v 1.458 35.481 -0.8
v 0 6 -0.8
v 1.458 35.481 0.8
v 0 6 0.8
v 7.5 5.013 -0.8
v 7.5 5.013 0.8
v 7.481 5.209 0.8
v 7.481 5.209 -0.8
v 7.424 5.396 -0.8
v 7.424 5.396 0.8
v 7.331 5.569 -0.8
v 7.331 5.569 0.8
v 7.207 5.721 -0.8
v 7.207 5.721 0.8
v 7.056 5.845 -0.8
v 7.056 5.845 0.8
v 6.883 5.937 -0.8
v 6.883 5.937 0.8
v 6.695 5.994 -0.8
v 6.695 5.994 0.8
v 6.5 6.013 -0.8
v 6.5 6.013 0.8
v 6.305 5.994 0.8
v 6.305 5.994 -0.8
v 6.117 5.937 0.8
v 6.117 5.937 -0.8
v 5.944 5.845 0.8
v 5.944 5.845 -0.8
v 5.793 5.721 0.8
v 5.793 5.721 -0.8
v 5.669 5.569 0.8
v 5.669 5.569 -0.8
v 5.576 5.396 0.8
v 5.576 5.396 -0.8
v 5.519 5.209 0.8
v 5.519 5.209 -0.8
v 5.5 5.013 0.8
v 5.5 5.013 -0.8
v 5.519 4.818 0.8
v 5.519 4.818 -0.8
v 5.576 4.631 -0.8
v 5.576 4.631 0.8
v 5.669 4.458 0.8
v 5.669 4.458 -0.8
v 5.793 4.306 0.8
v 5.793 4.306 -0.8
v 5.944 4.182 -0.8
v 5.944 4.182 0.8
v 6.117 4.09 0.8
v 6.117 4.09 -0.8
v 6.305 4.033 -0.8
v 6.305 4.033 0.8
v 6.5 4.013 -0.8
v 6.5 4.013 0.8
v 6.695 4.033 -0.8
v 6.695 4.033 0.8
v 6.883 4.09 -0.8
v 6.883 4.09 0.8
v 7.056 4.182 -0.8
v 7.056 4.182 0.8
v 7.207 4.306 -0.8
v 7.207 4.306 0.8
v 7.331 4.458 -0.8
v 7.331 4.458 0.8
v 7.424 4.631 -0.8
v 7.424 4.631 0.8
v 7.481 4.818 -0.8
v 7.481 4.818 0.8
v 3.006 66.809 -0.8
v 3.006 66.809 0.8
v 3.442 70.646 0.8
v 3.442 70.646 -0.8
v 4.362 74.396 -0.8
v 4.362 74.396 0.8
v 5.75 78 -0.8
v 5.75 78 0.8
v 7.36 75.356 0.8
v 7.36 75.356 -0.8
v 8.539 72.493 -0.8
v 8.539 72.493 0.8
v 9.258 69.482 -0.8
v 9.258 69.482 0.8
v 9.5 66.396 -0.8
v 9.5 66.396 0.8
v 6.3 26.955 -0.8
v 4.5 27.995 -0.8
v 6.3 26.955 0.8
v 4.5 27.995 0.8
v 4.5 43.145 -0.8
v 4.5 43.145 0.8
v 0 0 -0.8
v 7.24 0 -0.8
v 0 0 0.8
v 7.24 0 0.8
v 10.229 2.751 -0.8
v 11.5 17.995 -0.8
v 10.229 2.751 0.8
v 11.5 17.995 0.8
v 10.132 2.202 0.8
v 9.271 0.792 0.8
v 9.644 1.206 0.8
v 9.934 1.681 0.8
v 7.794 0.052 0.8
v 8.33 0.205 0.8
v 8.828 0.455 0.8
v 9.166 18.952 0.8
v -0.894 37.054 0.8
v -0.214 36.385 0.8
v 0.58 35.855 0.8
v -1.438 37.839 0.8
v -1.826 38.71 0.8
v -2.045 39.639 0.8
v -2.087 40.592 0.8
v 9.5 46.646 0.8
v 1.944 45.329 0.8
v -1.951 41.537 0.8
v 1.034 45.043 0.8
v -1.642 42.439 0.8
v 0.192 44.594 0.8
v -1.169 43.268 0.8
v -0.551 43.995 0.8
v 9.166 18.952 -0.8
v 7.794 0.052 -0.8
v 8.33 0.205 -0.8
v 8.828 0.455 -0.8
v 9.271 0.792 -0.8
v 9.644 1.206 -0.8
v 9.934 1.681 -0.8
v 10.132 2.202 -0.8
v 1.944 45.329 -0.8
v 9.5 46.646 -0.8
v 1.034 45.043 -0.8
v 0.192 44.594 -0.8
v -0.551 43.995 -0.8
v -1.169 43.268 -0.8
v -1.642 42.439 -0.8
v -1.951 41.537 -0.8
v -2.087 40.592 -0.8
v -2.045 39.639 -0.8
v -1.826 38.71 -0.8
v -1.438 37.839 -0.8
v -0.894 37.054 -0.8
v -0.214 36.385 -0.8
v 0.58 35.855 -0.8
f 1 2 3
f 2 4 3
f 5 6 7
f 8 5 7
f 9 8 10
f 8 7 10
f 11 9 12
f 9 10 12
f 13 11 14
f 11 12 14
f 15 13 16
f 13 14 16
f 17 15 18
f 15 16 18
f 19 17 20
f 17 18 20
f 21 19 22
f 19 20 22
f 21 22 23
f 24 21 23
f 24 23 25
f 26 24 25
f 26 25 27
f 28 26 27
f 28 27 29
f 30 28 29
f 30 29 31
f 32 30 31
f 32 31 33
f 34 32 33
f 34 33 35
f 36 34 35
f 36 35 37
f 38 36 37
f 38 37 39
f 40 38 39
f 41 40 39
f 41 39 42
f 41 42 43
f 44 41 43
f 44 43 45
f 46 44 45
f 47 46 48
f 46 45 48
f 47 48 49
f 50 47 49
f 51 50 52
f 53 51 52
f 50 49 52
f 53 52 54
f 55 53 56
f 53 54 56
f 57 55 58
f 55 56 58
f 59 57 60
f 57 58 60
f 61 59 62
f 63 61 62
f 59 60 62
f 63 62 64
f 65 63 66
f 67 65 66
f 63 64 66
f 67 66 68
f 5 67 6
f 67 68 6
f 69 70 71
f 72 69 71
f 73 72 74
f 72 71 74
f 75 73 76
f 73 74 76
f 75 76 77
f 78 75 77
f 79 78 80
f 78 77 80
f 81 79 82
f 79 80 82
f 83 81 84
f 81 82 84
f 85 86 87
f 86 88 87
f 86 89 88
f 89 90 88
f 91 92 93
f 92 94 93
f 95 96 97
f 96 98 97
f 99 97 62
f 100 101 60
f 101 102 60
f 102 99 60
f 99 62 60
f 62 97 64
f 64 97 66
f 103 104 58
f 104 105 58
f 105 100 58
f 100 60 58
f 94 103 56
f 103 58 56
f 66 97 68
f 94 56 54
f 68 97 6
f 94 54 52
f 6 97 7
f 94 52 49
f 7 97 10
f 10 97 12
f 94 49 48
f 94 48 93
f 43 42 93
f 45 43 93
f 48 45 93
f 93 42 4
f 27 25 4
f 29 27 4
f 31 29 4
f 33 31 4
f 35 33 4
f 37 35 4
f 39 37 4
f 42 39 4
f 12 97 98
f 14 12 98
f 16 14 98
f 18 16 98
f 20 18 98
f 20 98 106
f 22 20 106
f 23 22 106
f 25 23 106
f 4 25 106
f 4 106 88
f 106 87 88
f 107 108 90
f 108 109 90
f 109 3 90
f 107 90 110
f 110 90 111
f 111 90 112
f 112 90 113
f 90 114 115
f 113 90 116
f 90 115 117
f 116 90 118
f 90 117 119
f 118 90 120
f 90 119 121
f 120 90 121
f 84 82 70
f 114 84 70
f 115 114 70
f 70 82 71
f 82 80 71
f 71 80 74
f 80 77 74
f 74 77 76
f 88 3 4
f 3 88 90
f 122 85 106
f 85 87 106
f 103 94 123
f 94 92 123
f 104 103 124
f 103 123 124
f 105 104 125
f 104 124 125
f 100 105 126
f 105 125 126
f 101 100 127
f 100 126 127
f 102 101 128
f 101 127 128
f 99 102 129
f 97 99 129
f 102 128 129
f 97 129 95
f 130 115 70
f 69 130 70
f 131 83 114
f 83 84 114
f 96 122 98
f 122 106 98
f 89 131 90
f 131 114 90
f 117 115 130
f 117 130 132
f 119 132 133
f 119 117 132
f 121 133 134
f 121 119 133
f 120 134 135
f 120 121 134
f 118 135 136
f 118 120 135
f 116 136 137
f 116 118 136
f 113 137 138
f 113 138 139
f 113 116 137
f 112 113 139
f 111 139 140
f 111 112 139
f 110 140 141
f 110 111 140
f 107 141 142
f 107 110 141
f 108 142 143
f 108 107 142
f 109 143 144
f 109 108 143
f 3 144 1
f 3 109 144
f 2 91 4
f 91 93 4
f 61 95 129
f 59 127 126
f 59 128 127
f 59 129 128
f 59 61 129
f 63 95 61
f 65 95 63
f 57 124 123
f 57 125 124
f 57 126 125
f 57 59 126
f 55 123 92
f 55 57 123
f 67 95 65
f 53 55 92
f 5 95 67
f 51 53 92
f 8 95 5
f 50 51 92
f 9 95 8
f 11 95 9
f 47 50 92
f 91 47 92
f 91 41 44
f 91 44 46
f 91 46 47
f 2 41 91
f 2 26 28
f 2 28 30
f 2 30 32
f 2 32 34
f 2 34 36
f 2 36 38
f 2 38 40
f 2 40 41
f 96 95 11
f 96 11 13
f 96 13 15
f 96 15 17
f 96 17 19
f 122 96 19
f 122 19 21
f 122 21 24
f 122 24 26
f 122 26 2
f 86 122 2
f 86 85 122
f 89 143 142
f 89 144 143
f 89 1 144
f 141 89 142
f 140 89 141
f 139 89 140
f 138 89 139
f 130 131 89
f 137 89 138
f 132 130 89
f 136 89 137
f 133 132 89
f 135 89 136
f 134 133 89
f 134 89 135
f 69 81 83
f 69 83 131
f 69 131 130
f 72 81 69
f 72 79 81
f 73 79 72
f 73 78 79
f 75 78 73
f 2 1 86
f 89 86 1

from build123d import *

# Parameters (mm, degrees)
BOSS_EXTRUDE3_DEPTH = 0.8
FILLET2_R           = 3
SKETCH2_R           = 1
CUT_EXTRUDE1_DEPTH  = 79.859431903


with BuildPart() as part:
    # Sketch1 → Boss-Extrude3 (new, symmetric)
    with BuildSketch(Plane.XY):
        with BuildLine():
            ThreePointArc((5.75, 78), (8.53922468, 72.493261963), (9.5, 66.395651864))
            Line((9.5, 66.395651864), (9.5, 46.645651864))
            Line((9.5, 46.645651864), (4.5, 43.144614173))
            Line((4.5, 43.144614173), (4.5, 27.994614173))
            Line((4.5, 27.994614173), (6.3, 26.955383689))
            Line((6.3, 26.955383689), (9.165788003, 18.951905633))
            Line((9.165788003, 18.951905633), (11.5, 17.994614173))
            Line((11.5, 17.994614173), (10, 0))
            Line((10, 0), (0, 0))
            Line((0, 0), (0, 6))
            Line((0, 6), (3.006461475, 66.80874217))
            ThreePointArc((3.006461475, 66.80874217), (3.842195438, 72.535780218), (5.75, 78))
        make_face()
        with BuildLine():
            ThreePointArc((1.944453421, 45.328548769), (-2.087316609, 40.592191664), (1.45758967, 35.481234056))
            Line((1.45758967, 35.481234056), (1.944453421, 45.328548769))
        make_face()
    extrude(amount=BOSS_EXTRUDE3_DEPTH, both=True)

    # Fillet2
    fillet2_edges = [part.edges().sort_by_distance(p)[0] for p in [
        (10, 0, 0),
    ]]
    fillet(fillet2_edges, radius=FILLET2_R)

    # Sketch2 → Cut-Extrude1 (cut, through all)
    with BuildSketch(Plane.XY.offset(0.8)):
        with Locations((6.5, 5.01349848)):
            Circle(SKETCH2_R)
    extrude(amount=-CUT_EXTRUDE1_DEPTH, mode=Mode.SUBTRACT)


solid = part.part
